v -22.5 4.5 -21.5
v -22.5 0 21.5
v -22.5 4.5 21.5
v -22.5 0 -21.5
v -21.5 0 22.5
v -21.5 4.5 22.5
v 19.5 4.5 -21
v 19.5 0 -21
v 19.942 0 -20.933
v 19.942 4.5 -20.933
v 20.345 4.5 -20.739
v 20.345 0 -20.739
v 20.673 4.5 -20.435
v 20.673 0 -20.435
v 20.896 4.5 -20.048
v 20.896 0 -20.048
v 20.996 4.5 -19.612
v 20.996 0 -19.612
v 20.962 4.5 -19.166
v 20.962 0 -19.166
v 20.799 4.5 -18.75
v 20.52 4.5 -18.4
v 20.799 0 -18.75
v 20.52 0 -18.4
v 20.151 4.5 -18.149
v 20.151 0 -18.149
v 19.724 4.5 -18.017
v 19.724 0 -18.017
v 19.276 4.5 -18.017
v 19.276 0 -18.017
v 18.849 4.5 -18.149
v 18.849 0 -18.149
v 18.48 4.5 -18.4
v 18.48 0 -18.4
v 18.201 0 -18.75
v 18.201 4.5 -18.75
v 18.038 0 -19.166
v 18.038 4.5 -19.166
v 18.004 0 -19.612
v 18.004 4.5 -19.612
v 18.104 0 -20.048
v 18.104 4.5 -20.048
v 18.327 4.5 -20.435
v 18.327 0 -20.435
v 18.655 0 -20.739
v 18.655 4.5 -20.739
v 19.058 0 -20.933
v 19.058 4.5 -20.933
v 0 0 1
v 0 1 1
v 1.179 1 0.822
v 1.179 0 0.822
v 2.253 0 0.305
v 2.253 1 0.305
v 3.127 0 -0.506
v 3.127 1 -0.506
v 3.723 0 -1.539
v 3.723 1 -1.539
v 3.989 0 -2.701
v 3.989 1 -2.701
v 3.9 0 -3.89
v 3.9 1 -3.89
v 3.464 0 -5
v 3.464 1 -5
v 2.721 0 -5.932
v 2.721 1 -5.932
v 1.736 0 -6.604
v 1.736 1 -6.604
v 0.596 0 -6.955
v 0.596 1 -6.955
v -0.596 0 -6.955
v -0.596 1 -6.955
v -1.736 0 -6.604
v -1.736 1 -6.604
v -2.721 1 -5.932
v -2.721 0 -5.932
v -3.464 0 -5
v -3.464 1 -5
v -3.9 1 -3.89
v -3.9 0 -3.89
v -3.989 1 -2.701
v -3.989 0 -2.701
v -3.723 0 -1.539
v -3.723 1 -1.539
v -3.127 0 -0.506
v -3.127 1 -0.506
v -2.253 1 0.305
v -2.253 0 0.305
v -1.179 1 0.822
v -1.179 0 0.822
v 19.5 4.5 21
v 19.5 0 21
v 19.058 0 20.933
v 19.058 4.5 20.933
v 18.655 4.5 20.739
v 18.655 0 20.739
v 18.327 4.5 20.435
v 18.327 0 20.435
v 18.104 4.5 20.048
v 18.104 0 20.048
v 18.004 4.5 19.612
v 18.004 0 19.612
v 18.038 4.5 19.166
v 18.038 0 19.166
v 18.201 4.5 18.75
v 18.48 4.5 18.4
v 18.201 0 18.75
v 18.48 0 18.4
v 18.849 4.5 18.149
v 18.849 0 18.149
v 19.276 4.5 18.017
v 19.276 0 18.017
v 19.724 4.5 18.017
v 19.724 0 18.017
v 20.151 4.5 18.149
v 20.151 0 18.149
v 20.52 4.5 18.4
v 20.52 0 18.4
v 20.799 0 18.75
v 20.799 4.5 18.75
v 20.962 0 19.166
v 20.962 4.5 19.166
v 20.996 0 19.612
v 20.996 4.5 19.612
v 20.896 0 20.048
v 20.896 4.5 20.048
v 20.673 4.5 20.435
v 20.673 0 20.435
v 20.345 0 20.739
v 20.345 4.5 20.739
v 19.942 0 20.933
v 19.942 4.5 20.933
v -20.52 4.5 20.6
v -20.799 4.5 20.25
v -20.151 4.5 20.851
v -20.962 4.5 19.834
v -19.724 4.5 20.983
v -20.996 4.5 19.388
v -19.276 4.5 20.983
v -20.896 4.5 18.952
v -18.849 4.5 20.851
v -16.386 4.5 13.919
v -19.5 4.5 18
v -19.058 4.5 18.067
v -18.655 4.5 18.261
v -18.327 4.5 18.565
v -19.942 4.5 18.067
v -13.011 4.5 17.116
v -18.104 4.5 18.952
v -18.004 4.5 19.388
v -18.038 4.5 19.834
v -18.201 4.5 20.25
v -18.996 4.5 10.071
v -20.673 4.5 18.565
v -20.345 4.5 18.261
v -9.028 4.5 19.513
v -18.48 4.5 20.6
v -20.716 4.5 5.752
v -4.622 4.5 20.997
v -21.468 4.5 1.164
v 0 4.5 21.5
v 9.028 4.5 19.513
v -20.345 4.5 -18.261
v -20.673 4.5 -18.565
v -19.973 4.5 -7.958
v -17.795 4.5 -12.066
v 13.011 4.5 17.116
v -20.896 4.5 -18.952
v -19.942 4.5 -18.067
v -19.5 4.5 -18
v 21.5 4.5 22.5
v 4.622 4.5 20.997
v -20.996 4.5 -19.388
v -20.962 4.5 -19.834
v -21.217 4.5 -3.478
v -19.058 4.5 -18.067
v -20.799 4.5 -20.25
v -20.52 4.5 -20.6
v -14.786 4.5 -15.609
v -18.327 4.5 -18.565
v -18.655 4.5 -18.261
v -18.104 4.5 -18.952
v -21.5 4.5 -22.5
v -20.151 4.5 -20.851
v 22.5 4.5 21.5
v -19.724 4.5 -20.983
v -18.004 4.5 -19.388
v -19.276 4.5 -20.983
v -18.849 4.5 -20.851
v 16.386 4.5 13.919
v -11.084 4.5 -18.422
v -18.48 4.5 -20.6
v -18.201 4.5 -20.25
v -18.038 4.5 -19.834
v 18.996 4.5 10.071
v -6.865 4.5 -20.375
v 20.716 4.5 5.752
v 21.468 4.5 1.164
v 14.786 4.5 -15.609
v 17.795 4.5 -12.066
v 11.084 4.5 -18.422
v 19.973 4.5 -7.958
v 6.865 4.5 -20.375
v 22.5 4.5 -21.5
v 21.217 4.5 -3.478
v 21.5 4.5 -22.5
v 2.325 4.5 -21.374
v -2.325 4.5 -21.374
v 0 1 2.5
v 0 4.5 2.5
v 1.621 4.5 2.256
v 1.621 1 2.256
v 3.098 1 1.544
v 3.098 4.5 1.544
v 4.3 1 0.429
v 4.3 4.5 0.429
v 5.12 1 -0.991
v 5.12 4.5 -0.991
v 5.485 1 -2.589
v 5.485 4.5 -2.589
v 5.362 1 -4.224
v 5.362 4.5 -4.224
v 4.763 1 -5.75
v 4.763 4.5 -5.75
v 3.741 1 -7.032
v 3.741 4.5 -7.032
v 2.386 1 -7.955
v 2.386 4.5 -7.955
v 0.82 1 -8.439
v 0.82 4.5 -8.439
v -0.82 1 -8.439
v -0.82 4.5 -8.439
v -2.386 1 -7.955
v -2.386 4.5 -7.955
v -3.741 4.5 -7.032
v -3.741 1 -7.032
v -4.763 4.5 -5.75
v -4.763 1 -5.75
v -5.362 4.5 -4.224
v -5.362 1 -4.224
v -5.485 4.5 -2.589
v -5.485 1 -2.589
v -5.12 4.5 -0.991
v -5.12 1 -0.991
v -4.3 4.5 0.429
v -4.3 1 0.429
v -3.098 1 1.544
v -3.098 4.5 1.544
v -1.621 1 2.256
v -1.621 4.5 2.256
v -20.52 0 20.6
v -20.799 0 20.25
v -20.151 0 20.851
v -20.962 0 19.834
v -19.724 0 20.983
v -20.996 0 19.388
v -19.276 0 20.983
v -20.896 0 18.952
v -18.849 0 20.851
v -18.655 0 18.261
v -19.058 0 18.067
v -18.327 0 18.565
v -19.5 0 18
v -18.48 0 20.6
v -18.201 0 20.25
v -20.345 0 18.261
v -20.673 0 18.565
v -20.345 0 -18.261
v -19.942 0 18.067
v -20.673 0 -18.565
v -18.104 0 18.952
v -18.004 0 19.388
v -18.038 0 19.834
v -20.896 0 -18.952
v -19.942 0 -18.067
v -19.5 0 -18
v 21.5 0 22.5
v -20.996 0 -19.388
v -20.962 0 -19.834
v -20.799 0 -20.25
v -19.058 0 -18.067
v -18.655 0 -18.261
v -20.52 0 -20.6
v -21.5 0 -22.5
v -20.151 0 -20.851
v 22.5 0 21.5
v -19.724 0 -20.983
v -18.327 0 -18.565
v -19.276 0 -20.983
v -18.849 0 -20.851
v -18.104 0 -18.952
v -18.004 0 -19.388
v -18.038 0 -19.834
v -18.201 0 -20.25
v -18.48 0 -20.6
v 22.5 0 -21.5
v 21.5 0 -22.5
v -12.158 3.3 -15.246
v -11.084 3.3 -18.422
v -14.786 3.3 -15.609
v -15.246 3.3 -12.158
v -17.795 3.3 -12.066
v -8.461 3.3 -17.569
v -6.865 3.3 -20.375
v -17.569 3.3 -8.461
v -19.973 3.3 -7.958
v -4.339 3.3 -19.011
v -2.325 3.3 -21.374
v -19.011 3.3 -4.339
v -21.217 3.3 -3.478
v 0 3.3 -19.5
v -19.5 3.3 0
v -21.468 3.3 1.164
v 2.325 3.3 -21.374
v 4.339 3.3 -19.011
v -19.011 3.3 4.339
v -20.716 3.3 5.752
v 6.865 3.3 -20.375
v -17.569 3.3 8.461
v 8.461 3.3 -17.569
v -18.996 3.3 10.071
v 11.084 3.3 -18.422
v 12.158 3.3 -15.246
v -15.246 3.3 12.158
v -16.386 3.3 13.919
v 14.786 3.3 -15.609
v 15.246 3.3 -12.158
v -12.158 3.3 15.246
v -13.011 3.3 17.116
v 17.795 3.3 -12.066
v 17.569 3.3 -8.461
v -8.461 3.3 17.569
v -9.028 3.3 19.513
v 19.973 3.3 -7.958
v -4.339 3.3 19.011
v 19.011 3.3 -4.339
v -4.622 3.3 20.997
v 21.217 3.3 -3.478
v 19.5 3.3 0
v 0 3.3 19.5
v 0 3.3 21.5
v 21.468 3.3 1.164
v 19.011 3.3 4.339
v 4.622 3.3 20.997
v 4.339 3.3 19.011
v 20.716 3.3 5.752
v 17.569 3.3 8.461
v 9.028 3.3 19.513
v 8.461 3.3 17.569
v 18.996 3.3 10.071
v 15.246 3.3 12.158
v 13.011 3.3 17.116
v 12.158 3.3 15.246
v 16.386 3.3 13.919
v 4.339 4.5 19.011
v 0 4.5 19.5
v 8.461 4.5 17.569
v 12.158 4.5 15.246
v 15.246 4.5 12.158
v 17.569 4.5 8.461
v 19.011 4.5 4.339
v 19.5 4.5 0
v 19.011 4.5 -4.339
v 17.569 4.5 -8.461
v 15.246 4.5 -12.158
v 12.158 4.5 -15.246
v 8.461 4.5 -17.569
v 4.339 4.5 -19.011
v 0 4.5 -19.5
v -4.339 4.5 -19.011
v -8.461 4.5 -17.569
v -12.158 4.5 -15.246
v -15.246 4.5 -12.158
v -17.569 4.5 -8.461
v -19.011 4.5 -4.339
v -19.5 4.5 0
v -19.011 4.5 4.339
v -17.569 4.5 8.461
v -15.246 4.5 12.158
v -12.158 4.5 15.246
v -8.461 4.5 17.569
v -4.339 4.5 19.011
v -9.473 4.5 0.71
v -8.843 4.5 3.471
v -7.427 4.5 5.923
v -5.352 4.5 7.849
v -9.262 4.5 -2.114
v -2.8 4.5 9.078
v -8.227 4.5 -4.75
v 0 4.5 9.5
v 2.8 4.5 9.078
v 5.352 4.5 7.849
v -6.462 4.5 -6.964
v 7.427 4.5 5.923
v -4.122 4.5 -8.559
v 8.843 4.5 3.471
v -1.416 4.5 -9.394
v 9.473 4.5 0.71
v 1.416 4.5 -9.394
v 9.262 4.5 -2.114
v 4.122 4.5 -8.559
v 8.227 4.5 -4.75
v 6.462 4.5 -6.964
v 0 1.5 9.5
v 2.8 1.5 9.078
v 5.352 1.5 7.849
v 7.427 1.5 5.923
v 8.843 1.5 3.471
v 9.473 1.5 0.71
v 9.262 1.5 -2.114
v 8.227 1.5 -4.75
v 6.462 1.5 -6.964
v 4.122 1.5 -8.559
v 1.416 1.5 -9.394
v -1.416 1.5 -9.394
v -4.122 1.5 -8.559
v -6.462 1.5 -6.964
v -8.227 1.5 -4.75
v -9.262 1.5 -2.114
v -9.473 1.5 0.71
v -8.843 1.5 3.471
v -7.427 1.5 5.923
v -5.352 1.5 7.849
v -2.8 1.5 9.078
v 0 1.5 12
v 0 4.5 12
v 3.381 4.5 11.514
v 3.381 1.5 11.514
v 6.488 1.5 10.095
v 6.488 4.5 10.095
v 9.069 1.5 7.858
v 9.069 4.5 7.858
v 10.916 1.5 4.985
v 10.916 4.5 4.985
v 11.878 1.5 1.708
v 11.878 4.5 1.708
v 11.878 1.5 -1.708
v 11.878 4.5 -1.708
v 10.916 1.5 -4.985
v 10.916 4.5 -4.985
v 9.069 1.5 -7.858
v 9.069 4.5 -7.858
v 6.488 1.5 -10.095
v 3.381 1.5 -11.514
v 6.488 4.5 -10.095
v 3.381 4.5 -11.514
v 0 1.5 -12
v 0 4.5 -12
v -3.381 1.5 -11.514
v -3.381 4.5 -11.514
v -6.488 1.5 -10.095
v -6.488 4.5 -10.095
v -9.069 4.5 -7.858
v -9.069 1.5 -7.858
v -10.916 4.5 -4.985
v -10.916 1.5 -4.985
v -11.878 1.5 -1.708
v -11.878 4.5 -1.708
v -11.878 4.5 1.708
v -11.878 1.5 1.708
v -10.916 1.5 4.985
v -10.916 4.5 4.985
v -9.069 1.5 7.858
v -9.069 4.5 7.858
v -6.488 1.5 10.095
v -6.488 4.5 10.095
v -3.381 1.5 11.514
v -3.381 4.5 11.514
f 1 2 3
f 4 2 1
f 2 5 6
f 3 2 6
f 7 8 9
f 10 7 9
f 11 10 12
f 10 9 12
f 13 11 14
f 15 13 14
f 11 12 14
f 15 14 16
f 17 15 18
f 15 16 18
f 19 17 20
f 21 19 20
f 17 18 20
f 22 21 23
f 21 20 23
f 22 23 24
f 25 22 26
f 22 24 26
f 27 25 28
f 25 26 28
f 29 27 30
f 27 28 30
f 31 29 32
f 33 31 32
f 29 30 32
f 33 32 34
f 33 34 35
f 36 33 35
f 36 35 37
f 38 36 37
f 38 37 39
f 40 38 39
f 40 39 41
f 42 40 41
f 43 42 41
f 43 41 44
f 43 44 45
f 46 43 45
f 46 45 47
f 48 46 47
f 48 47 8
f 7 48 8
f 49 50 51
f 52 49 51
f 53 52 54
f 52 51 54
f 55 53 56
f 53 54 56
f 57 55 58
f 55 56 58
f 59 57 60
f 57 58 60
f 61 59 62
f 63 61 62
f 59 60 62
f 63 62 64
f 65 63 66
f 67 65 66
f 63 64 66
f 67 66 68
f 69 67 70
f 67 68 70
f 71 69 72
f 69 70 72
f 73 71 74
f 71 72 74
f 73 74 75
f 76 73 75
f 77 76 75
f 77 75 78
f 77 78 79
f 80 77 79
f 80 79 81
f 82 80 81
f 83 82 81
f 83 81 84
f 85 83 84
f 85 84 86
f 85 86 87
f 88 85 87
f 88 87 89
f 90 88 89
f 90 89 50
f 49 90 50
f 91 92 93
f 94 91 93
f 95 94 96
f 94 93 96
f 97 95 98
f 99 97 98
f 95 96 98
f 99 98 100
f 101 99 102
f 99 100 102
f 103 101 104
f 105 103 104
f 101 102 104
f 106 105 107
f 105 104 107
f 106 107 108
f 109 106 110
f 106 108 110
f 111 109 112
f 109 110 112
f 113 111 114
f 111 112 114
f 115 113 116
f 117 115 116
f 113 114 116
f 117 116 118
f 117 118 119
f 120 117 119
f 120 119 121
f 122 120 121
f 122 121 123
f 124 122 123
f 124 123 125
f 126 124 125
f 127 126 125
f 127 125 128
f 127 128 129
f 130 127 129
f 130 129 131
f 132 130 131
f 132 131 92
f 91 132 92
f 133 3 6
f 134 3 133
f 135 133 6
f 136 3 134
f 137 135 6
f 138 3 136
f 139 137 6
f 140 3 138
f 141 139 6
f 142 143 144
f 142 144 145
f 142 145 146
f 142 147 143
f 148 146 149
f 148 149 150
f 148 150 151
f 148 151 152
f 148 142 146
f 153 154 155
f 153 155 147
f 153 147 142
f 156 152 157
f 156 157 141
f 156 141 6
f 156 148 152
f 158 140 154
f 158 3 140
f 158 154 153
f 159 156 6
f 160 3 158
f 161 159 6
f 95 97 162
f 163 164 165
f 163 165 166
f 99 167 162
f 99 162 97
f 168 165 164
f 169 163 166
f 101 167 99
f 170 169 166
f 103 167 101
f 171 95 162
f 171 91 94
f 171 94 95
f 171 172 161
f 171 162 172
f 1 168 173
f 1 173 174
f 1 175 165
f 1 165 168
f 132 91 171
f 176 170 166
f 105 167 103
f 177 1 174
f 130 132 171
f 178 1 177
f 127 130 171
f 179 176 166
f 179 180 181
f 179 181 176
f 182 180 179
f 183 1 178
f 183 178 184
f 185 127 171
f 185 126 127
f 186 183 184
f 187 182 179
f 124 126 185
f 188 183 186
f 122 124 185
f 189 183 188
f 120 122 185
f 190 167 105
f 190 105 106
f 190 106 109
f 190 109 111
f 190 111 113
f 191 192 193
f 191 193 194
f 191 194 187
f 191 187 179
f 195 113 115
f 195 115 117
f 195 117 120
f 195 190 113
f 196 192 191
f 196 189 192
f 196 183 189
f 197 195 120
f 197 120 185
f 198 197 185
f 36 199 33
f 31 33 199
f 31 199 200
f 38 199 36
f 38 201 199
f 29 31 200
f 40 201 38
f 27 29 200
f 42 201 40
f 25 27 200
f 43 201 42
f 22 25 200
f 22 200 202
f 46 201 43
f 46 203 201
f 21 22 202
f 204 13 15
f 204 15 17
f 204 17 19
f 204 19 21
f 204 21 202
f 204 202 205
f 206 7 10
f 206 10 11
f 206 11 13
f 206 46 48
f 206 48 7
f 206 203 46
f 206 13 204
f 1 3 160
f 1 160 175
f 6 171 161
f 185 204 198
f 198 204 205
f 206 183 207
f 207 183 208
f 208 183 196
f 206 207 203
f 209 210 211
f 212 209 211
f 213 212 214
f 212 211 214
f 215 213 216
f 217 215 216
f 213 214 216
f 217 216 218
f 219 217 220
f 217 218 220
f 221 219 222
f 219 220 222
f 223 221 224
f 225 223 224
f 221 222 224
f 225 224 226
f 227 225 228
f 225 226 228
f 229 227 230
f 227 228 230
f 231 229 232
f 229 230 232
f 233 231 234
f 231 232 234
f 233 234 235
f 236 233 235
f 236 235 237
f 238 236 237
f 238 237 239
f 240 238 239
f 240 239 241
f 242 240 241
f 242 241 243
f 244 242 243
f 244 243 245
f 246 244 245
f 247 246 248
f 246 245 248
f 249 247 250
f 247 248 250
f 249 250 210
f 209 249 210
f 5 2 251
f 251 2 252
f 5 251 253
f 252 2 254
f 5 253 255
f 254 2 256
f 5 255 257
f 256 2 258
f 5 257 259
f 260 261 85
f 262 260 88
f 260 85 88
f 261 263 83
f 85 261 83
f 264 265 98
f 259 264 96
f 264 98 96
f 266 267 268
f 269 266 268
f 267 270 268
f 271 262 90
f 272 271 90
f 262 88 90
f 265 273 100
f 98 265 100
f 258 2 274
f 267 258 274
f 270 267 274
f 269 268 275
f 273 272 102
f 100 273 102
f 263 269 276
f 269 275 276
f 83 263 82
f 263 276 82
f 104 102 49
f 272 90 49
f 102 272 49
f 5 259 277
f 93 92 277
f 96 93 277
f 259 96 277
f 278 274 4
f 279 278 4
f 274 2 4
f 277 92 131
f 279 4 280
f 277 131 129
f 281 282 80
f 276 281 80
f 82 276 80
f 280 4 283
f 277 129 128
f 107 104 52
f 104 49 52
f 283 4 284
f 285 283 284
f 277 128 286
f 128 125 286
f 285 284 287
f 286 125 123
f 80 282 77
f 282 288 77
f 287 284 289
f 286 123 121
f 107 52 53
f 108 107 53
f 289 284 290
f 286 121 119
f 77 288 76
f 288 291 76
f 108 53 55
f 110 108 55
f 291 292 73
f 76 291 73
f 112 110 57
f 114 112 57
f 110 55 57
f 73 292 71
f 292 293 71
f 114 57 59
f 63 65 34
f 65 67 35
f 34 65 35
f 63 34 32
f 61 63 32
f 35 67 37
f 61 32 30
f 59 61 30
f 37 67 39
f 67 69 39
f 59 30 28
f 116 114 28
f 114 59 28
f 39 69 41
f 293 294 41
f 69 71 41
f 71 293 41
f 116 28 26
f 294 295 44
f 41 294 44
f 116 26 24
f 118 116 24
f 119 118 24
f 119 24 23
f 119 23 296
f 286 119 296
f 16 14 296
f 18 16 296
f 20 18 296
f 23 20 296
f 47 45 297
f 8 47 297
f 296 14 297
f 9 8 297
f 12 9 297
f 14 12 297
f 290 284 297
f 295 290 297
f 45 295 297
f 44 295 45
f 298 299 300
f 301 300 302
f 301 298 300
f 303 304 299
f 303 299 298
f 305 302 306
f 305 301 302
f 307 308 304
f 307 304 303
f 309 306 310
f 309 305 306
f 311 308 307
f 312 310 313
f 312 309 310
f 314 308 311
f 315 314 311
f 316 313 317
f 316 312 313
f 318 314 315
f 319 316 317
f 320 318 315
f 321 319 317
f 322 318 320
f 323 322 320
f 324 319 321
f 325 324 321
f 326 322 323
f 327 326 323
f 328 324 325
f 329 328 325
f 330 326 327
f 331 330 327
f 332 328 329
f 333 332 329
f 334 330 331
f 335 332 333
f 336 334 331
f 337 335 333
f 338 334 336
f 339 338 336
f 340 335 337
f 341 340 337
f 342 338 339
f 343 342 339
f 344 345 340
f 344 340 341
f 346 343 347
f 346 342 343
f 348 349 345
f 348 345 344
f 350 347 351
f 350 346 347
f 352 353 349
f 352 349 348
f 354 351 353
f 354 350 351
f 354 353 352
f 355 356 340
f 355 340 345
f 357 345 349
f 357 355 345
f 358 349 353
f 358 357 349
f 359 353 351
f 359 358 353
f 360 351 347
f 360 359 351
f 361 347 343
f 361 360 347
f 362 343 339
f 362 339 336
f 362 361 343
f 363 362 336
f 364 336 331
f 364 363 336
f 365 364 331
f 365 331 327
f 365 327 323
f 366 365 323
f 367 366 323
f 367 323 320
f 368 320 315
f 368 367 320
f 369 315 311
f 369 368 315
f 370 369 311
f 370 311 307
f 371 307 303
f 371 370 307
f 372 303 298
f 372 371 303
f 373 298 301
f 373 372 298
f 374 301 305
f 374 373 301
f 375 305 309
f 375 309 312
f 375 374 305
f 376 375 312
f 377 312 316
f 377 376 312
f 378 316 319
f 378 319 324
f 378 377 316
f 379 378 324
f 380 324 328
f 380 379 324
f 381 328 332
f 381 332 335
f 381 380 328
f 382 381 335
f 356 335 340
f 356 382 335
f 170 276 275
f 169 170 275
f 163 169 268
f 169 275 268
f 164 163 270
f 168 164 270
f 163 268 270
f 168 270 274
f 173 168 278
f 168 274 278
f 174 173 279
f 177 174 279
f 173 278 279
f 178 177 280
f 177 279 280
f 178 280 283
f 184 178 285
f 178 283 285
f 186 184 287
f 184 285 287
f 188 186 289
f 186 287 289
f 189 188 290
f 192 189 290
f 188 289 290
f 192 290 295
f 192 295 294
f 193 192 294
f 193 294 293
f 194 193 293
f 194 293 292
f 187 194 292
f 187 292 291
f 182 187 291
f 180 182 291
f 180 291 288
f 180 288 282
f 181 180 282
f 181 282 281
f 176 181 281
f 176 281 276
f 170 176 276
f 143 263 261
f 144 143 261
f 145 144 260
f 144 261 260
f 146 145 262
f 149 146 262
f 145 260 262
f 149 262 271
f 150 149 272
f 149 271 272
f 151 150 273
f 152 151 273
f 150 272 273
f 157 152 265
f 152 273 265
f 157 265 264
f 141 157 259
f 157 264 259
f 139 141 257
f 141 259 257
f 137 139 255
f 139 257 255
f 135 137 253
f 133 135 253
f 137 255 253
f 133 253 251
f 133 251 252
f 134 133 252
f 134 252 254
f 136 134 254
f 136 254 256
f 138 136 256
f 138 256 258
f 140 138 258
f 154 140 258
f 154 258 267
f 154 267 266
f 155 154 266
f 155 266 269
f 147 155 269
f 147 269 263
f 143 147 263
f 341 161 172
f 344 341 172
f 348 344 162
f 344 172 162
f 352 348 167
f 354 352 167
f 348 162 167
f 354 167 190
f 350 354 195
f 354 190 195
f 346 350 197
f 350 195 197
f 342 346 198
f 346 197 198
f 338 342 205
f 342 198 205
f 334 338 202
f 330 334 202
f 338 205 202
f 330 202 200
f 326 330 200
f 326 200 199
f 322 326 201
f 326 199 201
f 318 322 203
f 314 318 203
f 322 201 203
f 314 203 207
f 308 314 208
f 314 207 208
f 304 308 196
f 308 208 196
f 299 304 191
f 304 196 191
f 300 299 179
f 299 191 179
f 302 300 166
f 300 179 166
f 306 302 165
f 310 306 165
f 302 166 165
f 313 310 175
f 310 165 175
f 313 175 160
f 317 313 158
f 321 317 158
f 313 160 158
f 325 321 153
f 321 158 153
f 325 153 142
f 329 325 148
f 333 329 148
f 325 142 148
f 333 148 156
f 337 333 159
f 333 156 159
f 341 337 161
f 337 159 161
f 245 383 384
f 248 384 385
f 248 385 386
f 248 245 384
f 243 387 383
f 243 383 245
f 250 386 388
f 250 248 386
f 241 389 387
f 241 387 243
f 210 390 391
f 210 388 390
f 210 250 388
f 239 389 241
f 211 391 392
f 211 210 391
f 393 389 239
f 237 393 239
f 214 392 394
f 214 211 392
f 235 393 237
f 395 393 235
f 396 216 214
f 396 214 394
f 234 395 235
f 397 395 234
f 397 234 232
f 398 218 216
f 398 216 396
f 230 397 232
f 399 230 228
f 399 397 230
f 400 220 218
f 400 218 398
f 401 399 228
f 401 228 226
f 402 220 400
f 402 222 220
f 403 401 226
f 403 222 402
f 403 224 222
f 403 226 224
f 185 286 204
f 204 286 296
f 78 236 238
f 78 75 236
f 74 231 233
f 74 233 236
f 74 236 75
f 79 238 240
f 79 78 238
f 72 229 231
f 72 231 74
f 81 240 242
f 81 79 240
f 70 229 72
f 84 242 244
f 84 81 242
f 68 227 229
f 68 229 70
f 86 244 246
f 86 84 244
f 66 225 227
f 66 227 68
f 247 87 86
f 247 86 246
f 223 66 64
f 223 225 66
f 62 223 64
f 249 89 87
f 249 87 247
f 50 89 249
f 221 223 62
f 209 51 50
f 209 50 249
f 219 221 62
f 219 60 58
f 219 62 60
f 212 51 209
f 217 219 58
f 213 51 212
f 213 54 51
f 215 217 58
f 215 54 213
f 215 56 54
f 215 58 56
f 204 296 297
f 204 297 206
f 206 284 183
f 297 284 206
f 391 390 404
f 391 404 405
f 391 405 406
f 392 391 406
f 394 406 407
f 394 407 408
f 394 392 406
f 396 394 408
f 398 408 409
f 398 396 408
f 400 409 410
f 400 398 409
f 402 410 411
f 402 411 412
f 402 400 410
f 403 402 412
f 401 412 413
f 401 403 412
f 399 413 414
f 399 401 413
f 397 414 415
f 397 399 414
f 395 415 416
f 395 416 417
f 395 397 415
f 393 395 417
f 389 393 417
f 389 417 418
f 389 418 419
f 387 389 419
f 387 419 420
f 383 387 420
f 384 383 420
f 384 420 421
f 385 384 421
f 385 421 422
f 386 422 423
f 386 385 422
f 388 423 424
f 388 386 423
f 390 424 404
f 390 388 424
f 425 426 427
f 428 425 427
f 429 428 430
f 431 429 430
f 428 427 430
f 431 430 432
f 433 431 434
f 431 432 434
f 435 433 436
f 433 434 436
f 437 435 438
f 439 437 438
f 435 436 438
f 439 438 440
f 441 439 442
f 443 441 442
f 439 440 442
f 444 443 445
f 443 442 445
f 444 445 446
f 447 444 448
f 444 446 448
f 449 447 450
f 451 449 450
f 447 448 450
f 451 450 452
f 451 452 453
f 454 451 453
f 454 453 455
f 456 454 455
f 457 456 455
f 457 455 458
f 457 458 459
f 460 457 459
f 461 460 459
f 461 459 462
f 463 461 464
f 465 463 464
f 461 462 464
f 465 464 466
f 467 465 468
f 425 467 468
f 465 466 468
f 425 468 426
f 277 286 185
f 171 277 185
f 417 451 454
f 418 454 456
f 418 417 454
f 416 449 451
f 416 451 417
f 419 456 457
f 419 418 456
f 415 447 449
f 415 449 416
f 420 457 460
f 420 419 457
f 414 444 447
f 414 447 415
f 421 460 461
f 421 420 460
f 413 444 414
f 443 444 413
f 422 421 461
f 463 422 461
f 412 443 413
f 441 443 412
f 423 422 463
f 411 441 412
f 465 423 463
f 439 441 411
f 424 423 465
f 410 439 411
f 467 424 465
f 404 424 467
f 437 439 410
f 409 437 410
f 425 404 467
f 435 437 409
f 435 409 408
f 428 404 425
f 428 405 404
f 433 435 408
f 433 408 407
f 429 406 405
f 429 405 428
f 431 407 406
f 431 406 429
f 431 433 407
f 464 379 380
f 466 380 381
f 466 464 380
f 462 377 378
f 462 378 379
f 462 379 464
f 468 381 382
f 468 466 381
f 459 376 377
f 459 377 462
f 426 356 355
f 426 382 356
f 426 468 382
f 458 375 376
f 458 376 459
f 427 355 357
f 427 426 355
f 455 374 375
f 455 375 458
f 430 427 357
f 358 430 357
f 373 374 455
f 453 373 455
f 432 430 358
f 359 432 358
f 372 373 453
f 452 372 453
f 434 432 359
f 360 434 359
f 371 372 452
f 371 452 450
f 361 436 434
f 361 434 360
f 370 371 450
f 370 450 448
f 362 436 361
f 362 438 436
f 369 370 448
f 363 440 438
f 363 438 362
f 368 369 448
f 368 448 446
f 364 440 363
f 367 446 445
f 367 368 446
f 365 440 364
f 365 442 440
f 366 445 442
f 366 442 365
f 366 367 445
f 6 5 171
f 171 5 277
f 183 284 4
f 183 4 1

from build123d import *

# Parameters (mm, degrees)
SKETCH_1_W          = 45
SKETCH_1_H          = 45
EXTRUDE_1_DEPTH     = 4.5
SKETCH_2_R          = 5.5
CUT_EXTRUDE_1_DEPTH = 3.5
SKETCH_3_R          = 4
CUT_EXTRUDE_2_DEPTH = 33.011716605
SKETCH_4_R          = 12
SKETCH_4_R_2        = 9.5
CUT_EXTRUDE_3_DEPTH = 3
SKETCH_5_R          = 21.5
SKETCH_5_R_2        = 19.5
CUT_EXTRUDE_4_DEPTH = 1.2
CHAMFER_1_SIZE      = 1
SKETCH_6_R          = 1.5
CUT_EXTRUDE_5_DEPTH = 33.136427928


with BuildPart() as part:
    # 草图1 → 凸台-拉伸1 (new body)
    with BuildSketch(Plane(origin=(0, 0, 0), x_dir=(1, 0, 0), z_dir=(0, 1, 0))):
        Rectangle(SKETCH_1_W, SKETCH_1_H)
    extrude(amount=EXTRUDE_1_DEPTH)

    # 草图2 → 切除-拉伸1 (cut)
    with BuildSketch(Plane(origin=(0, 4.5, 0), x_dir=(1, 0, 0), z_dir=(0, 1, 0))):
        with Locations(Location((0, 3, 0), (0, 0, 270))):
            Circle(SKETCH_2_R)
    extrude(amount=-CUT_EXTRUDE_1_DEPTH, mode=Mode.SUBTRACT)

    # 草图3 → 切除-拉伸2 (cut, through all)
    with BuildSketch(Plane(origin=(0, 1, 0), x_dir=(1, 0, 0), z_dir=(0, 1, 0))):
        with Locations(Location((0, 3, 0), (0, 0, 270))):
            Circle(SKETCH_3_R)
    extrude(amount=-CUT_EXTRUDE_2_DEPTH, mode=Mode.SUBTRACT)

    # 草图4 → 切除-拉伸3 (cut)
    with BuildSketch(Plane(origin=(0, 4.5, 0), x_dir=(1, 0, 0), z_dir=(0, 1, 0))):
        with Locations(Location((0, 0, 0), (0, 0, 270))):
            Circle(SKETCH_4_R)
        with Locations(Location((0, 0, 0), (0, 0, 270))):
            Circle(SKETCH_4_R_2, mode=Mode.SUBTRACT)
    extrude(amount=-CUT_EXTRUDE_3_DEPTH, mode=Mode.SUBTRACT)

    # 草图5 → 切除-拉伸4 (cut)
    with BuildSketch(Plane(origin=(0, 4.5, 0), x_dir=(1, 0, 0), z_dir=(0, 1, 0))):
        with Locations(Location((0, 0, 0), (0, 0, 270))):
            Circle(SKETCH_5_R)
        with Locations(Location((0, 0, 0), (0, 0, 270))):
            Circle(SKETCH_5_R_2, mode=Mode.SUBTRACT)
    extrude(amount=-CUT_EXTRUDE_4_DEPTH, mode=Mode.SUBTRACT)

    # 倒角1
    chamfer_1_edges = [part.edges().sort_by_distance(p)[0] for p in [
        (22.5, 2.25, 22.5),
        (-22.5, 2.25, 22.5),
        (-22.5, 2.25, -22.5),
        (22.5, 2.25, -22.5),
    ]]
    chamfer(chamfer_1_edges, length=CHAMFER_1_SIZE)

    # 草图6 → 切除-拉伸5 (cut, through all)
    with BuildSketch(Plane.XZ):
        with Locations(Location((-19.5, 19.5, 0), (0, 0, 270))):
            Circle(SKETCH_6_R)
        with Locations(Location((19.5, 19.5, 0), (0, 0, 90))):
            Circle(SKETCH_6_R)
        with Locations(Location((19.5, -19.5, 0), (0, 0, 270))):
            Circle(SKETCH_6_R)
        with Locations(Location((-19.5, -19.5, 0), (0, 0, 90))):
            Circle(SKETCH_6_R)
    extrude(amount=-CUT_EXTRUDE_5_DEPTH, mode=Mode.SUBTRACT)


solid = part.part
